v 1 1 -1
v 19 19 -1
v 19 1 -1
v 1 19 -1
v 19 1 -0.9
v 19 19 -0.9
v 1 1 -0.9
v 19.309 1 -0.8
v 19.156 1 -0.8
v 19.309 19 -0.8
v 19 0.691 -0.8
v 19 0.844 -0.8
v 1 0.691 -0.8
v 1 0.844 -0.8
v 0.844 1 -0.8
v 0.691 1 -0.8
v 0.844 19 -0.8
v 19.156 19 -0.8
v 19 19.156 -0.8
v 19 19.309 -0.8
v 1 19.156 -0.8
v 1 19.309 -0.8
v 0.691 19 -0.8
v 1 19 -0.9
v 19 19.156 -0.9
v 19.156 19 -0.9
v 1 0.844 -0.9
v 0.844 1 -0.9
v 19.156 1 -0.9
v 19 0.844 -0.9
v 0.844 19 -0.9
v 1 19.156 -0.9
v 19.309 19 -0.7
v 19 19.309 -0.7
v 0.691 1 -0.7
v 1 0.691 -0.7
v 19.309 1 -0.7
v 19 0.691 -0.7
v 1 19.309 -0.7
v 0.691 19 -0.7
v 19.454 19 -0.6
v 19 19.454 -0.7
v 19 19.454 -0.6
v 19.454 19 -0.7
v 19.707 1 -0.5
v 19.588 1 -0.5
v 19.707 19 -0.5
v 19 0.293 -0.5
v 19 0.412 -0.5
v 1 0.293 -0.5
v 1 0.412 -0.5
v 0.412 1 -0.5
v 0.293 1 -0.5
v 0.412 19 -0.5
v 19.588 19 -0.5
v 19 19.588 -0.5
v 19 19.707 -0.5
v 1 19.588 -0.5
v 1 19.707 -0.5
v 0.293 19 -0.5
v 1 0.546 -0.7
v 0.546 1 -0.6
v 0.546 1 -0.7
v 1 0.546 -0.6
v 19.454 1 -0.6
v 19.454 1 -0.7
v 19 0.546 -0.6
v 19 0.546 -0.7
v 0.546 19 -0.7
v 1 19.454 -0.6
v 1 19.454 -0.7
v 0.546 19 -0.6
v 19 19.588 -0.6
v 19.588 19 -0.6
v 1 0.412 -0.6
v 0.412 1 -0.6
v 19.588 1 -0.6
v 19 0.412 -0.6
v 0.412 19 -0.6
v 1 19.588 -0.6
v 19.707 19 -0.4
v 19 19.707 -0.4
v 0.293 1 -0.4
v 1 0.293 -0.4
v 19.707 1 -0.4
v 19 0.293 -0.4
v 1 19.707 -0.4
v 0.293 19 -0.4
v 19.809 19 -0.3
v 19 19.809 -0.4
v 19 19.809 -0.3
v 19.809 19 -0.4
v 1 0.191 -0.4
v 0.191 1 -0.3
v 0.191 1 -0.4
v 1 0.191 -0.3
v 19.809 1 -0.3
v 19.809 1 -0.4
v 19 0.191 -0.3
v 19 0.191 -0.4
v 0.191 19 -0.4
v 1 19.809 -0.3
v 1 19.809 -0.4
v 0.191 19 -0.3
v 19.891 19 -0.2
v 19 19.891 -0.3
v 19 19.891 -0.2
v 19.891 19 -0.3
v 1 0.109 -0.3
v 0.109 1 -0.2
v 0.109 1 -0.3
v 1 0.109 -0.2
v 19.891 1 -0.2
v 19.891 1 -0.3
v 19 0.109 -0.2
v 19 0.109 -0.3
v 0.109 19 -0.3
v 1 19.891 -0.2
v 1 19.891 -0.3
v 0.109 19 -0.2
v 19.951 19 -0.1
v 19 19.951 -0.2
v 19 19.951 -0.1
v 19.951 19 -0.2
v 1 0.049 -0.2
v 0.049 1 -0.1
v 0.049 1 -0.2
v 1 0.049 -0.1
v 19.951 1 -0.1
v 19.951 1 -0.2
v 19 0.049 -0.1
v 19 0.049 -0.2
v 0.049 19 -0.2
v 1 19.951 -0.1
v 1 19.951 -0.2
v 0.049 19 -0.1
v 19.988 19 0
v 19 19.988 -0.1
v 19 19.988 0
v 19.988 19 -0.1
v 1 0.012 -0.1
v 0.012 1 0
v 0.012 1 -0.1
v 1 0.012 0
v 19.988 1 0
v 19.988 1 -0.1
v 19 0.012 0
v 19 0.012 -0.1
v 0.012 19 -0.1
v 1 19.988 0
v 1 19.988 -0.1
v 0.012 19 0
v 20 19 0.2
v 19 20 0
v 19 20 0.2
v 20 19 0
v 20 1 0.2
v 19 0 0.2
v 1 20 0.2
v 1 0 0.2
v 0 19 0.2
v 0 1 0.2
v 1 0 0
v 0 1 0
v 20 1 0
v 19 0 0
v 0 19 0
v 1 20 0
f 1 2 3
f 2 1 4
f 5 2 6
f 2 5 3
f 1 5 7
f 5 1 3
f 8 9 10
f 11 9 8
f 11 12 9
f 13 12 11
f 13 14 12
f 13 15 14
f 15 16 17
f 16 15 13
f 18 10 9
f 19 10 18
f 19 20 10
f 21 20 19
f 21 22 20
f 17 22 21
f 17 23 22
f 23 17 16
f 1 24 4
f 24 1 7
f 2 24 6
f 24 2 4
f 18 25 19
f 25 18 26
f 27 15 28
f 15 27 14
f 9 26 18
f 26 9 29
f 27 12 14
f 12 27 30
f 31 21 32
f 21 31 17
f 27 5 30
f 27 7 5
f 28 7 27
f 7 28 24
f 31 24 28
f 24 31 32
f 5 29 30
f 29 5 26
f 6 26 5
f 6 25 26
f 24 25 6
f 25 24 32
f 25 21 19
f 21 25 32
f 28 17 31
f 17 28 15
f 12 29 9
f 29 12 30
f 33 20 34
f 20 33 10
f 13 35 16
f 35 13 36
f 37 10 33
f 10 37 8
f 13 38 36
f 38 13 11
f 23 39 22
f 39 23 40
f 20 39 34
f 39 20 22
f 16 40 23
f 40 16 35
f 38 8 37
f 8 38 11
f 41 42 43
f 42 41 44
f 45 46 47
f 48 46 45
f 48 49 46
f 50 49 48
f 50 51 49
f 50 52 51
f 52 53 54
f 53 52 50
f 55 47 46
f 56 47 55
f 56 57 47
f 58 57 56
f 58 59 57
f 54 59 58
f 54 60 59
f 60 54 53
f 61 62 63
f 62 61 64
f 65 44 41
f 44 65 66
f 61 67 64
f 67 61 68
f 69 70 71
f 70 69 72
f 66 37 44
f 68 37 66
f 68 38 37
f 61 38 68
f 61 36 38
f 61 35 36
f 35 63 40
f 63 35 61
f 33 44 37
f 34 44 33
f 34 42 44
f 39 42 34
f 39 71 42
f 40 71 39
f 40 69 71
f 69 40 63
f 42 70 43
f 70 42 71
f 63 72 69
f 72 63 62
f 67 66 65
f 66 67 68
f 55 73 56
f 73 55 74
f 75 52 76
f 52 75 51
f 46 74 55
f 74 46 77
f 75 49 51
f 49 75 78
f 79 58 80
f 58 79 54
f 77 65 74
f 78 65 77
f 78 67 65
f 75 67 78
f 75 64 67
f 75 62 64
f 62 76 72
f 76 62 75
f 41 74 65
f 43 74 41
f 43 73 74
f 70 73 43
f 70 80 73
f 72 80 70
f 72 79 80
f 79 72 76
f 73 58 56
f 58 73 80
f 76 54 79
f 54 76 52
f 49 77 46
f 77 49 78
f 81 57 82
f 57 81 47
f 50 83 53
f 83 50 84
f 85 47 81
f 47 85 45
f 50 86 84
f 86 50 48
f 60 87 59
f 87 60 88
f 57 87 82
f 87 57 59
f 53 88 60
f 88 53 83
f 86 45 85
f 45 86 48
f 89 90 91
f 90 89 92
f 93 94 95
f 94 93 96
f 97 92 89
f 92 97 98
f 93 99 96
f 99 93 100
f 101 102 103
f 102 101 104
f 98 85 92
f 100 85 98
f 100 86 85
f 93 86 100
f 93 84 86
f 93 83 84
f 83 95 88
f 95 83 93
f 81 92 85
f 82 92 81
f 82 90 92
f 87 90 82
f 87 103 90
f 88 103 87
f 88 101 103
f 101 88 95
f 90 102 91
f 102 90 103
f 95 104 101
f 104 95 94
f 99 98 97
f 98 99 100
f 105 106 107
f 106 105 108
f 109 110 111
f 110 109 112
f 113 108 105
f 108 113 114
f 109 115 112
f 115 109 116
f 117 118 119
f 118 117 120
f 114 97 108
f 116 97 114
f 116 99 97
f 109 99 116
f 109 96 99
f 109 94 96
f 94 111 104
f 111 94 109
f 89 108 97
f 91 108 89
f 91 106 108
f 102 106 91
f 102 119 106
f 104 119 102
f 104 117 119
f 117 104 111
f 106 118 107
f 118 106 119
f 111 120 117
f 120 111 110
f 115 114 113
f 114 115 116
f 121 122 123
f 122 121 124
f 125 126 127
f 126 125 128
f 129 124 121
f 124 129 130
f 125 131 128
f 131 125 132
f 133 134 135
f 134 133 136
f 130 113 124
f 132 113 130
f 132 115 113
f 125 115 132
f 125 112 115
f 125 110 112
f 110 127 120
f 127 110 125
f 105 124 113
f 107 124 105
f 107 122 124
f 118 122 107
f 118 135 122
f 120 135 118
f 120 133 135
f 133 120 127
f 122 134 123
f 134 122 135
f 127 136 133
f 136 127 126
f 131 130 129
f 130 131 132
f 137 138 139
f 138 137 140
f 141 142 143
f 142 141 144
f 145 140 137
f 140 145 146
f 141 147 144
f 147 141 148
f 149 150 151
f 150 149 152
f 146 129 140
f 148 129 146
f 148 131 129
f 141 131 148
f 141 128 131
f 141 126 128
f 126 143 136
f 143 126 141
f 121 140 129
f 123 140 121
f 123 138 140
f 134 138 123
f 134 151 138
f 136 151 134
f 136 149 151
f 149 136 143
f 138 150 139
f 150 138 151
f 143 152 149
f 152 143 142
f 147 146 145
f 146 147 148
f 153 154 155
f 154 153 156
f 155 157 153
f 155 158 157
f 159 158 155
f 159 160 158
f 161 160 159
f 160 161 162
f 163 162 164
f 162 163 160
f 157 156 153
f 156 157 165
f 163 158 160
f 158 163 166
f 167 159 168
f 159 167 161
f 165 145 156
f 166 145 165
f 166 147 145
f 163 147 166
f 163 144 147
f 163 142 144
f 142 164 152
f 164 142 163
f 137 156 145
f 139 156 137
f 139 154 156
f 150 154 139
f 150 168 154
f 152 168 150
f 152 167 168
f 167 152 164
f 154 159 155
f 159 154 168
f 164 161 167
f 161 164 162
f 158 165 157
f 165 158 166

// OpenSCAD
module rounded_bottom(dx=1, dy=1, layer_height=0.1) {

    _join = 0.1;

    steps = dy / layer_height;
    angle_step = 90 / steps;

    translate([0, 0, -dy]) {
        for (i=[0:steps]) {
            dx_step = sin(angle_step * i) * dx;
            translate([0, 0, layer_height * i])
                linear_extrude(layer_height + _join)
                offset(r=dx_step)
                offset(delta=-dx)
                children();
        }
    }
}

rounded_bottom() square(20);
